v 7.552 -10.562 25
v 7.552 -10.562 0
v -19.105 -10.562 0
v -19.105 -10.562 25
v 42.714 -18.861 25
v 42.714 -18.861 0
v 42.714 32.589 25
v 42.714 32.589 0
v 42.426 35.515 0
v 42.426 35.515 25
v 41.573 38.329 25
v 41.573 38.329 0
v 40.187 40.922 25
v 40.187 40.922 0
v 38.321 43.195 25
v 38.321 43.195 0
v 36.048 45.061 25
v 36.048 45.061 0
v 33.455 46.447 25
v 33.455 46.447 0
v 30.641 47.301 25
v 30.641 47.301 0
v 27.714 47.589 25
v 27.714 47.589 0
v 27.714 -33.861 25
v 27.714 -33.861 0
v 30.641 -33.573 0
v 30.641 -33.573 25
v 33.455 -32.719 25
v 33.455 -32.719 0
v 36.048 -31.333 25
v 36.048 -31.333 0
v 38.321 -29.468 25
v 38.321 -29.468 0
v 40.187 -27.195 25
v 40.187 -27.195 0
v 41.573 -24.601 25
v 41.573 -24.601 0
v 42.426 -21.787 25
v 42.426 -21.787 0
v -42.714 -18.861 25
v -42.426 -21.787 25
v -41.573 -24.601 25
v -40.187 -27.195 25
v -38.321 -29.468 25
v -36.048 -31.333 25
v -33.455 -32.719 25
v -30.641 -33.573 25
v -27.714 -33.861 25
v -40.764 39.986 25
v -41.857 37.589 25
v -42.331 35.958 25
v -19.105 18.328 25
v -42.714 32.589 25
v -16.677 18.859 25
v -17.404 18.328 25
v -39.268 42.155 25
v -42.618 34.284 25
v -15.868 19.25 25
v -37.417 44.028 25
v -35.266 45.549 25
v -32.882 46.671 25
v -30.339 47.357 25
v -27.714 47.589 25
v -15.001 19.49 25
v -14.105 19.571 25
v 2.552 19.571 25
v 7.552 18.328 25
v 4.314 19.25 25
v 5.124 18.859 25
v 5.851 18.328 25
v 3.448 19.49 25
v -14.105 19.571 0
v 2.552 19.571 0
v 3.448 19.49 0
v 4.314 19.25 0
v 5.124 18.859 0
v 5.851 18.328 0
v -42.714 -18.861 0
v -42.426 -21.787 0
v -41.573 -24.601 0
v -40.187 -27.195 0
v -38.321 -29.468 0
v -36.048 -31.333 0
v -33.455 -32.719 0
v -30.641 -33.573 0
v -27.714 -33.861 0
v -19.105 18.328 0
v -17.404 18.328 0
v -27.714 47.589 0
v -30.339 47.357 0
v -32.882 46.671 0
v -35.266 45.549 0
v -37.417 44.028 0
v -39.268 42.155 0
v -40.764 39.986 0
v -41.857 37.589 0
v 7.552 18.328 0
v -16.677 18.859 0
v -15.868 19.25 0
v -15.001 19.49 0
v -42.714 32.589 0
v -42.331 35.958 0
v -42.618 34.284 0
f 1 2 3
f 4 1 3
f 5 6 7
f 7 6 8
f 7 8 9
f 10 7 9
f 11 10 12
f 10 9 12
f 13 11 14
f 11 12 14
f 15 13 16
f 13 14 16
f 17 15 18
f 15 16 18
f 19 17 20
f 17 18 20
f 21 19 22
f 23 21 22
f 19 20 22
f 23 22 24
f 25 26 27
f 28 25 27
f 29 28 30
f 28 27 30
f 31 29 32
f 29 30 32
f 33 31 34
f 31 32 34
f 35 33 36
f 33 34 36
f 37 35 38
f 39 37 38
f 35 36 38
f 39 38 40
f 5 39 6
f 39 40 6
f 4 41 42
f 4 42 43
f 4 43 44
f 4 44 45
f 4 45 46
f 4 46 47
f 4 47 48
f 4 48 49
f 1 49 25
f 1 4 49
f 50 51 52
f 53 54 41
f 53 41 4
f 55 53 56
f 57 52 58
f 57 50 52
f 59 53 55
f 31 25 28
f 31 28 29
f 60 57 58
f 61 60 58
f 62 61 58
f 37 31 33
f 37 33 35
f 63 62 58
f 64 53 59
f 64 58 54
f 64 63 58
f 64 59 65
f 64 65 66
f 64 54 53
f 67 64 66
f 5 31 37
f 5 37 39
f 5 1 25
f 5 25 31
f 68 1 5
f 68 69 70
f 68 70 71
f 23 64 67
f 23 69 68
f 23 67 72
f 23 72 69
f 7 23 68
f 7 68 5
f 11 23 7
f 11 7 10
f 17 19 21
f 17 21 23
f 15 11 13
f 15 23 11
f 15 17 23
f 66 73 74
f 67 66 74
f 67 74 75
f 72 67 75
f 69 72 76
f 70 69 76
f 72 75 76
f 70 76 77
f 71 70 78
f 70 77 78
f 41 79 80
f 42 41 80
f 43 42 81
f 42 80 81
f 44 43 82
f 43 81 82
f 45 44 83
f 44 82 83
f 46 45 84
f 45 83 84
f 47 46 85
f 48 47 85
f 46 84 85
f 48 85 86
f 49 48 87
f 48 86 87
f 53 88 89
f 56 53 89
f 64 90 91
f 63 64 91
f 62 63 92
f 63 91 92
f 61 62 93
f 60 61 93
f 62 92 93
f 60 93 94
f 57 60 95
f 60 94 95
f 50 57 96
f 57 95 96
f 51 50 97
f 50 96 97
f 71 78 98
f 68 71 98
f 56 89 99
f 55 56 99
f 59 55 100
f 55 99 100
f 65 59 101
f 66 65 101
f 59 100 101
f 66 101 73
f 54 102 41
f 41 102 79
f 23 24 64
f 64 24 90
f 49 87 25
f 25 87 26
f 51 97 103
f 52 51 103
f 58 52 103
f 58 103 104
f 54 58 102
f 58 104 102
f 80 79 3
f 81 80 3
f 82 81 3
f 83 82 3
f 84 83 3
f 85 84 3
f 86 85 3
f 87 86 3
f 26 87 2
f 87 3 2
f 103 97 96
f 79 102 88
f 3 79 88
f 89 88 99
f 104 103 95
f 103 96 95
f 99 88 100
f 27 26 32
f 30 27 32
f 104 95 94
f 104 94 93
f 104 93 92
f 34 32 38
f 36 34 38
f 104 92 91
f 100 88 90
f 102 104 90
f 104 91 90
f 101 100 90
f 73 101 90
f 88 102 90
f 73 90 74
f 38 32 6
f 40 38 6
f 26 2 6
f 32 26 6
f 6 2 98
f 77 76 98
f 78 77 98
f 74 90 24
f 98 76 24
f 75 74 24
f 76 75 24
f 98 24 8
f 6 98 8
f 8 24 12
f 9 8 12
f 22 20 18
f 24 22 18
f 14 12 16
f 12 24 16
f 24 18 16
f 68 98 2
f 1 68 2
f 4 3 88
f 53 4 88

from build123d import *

# Parameters (mm, degrees)
F1_DEPTH = 25


with BuildPart() as f1:
    # F0 (on Top) → F1 (new body)
    with BuildSketch(Plane.XY):
        with BuildLine():
            Line((-14.105032, 19.571008), (-27.714499, 47.588757))
            ThreePointArc((-27.714499, 47.588757), (-36.374753, 44.836205), (-41.856635, 37.588757))
            ThreePointArc((-41.856635, 37.588757), (-42.498477, 35.125286), (-42.714499, 32.588757))
            Line((-42.714499, 32.588757), (-19.105032, 14.571008))
            Line((-19.105032, 14.571008), (-19.105032, 18.328404))
            Line((-19.105032, 18.328404), (-17.403816, 18.328404))
            ThreePointArc((-17.403816, 18.328404), (-15.867562, 19.250056), (-14.105032, 19.571008))
        make_face()
        Polygon((27.714499, 47.588757), (-27.714499, 47.588757), (-14.105032, 19.571008), (2.551774, 19.571008), align=None)
        with BuildLine():
            ThreePointArc((42.714499, 32.588757), (38.321101, 43.195358), (27.714499, 47.588757))
            Line((27.714499, 47.588757), (2.551774, 19.571008))
            ThreePointArc((2.551774, 19.571008), (4.314304, 19.250056), (5.850558, 18.328404))
            Line((5.850558, 18.328404), (7.551774, 18.328404))
            Line((7.551774, 18.328404), (7.551774, 14.571008))
            Line((7.551774, 14.571008), (42.714499, 32.588757))
        make_face()
        Polygon((42.714499, -18.860948), (42.714499, 32.588757), (7.551774, 14.571008), (7.551774, -5.56213), align=None)
        Polygon((-19.105032, 14.571008), (-42.714499, 32.588757), (-42.714499, -18.860948), (-19.105032, -5.56213), align=None)
        with BuildLine():
            ThreePointArc((27.714499, -33.860948), (38.321101, -29.46755), (42.714499, -18.860948))
            Line((42.714499, -18.860948), (7.551774, -5.56213))
            Line((7.551774, -5.56213), (7.551774, -10.56213))
            Line((7.551774, -10.56213), (2.551774, -10.56213))
            Line((2.551774, -10.56213), (27.714499, -33.860948))
        make_face()
        with BuildLine():
            Line((-19.105032, -5.56213), (-42.714499, -18.860948))
            ThreePointArc((-42.714499, -18.860948), (-38.321101, -29.46755), (-27.714499, -33.860948))
            Line((-27.714499, -33.860948), (-14.105032, -10.56213))
            Line((-14.105032, -10.56213), (-19.105032, -10.56213))
            Line((-19.105032, -10.56213), (-19.105032, -5.56213))
        make_face()
        Polygon((-27.714499, -33.860948), (27.714499, -33.860948), (2.551774, -10.56213), (-14.105032, -10.56213), align=None)
    extrude(amount=F1_DEPTH)


solid = f1.part
